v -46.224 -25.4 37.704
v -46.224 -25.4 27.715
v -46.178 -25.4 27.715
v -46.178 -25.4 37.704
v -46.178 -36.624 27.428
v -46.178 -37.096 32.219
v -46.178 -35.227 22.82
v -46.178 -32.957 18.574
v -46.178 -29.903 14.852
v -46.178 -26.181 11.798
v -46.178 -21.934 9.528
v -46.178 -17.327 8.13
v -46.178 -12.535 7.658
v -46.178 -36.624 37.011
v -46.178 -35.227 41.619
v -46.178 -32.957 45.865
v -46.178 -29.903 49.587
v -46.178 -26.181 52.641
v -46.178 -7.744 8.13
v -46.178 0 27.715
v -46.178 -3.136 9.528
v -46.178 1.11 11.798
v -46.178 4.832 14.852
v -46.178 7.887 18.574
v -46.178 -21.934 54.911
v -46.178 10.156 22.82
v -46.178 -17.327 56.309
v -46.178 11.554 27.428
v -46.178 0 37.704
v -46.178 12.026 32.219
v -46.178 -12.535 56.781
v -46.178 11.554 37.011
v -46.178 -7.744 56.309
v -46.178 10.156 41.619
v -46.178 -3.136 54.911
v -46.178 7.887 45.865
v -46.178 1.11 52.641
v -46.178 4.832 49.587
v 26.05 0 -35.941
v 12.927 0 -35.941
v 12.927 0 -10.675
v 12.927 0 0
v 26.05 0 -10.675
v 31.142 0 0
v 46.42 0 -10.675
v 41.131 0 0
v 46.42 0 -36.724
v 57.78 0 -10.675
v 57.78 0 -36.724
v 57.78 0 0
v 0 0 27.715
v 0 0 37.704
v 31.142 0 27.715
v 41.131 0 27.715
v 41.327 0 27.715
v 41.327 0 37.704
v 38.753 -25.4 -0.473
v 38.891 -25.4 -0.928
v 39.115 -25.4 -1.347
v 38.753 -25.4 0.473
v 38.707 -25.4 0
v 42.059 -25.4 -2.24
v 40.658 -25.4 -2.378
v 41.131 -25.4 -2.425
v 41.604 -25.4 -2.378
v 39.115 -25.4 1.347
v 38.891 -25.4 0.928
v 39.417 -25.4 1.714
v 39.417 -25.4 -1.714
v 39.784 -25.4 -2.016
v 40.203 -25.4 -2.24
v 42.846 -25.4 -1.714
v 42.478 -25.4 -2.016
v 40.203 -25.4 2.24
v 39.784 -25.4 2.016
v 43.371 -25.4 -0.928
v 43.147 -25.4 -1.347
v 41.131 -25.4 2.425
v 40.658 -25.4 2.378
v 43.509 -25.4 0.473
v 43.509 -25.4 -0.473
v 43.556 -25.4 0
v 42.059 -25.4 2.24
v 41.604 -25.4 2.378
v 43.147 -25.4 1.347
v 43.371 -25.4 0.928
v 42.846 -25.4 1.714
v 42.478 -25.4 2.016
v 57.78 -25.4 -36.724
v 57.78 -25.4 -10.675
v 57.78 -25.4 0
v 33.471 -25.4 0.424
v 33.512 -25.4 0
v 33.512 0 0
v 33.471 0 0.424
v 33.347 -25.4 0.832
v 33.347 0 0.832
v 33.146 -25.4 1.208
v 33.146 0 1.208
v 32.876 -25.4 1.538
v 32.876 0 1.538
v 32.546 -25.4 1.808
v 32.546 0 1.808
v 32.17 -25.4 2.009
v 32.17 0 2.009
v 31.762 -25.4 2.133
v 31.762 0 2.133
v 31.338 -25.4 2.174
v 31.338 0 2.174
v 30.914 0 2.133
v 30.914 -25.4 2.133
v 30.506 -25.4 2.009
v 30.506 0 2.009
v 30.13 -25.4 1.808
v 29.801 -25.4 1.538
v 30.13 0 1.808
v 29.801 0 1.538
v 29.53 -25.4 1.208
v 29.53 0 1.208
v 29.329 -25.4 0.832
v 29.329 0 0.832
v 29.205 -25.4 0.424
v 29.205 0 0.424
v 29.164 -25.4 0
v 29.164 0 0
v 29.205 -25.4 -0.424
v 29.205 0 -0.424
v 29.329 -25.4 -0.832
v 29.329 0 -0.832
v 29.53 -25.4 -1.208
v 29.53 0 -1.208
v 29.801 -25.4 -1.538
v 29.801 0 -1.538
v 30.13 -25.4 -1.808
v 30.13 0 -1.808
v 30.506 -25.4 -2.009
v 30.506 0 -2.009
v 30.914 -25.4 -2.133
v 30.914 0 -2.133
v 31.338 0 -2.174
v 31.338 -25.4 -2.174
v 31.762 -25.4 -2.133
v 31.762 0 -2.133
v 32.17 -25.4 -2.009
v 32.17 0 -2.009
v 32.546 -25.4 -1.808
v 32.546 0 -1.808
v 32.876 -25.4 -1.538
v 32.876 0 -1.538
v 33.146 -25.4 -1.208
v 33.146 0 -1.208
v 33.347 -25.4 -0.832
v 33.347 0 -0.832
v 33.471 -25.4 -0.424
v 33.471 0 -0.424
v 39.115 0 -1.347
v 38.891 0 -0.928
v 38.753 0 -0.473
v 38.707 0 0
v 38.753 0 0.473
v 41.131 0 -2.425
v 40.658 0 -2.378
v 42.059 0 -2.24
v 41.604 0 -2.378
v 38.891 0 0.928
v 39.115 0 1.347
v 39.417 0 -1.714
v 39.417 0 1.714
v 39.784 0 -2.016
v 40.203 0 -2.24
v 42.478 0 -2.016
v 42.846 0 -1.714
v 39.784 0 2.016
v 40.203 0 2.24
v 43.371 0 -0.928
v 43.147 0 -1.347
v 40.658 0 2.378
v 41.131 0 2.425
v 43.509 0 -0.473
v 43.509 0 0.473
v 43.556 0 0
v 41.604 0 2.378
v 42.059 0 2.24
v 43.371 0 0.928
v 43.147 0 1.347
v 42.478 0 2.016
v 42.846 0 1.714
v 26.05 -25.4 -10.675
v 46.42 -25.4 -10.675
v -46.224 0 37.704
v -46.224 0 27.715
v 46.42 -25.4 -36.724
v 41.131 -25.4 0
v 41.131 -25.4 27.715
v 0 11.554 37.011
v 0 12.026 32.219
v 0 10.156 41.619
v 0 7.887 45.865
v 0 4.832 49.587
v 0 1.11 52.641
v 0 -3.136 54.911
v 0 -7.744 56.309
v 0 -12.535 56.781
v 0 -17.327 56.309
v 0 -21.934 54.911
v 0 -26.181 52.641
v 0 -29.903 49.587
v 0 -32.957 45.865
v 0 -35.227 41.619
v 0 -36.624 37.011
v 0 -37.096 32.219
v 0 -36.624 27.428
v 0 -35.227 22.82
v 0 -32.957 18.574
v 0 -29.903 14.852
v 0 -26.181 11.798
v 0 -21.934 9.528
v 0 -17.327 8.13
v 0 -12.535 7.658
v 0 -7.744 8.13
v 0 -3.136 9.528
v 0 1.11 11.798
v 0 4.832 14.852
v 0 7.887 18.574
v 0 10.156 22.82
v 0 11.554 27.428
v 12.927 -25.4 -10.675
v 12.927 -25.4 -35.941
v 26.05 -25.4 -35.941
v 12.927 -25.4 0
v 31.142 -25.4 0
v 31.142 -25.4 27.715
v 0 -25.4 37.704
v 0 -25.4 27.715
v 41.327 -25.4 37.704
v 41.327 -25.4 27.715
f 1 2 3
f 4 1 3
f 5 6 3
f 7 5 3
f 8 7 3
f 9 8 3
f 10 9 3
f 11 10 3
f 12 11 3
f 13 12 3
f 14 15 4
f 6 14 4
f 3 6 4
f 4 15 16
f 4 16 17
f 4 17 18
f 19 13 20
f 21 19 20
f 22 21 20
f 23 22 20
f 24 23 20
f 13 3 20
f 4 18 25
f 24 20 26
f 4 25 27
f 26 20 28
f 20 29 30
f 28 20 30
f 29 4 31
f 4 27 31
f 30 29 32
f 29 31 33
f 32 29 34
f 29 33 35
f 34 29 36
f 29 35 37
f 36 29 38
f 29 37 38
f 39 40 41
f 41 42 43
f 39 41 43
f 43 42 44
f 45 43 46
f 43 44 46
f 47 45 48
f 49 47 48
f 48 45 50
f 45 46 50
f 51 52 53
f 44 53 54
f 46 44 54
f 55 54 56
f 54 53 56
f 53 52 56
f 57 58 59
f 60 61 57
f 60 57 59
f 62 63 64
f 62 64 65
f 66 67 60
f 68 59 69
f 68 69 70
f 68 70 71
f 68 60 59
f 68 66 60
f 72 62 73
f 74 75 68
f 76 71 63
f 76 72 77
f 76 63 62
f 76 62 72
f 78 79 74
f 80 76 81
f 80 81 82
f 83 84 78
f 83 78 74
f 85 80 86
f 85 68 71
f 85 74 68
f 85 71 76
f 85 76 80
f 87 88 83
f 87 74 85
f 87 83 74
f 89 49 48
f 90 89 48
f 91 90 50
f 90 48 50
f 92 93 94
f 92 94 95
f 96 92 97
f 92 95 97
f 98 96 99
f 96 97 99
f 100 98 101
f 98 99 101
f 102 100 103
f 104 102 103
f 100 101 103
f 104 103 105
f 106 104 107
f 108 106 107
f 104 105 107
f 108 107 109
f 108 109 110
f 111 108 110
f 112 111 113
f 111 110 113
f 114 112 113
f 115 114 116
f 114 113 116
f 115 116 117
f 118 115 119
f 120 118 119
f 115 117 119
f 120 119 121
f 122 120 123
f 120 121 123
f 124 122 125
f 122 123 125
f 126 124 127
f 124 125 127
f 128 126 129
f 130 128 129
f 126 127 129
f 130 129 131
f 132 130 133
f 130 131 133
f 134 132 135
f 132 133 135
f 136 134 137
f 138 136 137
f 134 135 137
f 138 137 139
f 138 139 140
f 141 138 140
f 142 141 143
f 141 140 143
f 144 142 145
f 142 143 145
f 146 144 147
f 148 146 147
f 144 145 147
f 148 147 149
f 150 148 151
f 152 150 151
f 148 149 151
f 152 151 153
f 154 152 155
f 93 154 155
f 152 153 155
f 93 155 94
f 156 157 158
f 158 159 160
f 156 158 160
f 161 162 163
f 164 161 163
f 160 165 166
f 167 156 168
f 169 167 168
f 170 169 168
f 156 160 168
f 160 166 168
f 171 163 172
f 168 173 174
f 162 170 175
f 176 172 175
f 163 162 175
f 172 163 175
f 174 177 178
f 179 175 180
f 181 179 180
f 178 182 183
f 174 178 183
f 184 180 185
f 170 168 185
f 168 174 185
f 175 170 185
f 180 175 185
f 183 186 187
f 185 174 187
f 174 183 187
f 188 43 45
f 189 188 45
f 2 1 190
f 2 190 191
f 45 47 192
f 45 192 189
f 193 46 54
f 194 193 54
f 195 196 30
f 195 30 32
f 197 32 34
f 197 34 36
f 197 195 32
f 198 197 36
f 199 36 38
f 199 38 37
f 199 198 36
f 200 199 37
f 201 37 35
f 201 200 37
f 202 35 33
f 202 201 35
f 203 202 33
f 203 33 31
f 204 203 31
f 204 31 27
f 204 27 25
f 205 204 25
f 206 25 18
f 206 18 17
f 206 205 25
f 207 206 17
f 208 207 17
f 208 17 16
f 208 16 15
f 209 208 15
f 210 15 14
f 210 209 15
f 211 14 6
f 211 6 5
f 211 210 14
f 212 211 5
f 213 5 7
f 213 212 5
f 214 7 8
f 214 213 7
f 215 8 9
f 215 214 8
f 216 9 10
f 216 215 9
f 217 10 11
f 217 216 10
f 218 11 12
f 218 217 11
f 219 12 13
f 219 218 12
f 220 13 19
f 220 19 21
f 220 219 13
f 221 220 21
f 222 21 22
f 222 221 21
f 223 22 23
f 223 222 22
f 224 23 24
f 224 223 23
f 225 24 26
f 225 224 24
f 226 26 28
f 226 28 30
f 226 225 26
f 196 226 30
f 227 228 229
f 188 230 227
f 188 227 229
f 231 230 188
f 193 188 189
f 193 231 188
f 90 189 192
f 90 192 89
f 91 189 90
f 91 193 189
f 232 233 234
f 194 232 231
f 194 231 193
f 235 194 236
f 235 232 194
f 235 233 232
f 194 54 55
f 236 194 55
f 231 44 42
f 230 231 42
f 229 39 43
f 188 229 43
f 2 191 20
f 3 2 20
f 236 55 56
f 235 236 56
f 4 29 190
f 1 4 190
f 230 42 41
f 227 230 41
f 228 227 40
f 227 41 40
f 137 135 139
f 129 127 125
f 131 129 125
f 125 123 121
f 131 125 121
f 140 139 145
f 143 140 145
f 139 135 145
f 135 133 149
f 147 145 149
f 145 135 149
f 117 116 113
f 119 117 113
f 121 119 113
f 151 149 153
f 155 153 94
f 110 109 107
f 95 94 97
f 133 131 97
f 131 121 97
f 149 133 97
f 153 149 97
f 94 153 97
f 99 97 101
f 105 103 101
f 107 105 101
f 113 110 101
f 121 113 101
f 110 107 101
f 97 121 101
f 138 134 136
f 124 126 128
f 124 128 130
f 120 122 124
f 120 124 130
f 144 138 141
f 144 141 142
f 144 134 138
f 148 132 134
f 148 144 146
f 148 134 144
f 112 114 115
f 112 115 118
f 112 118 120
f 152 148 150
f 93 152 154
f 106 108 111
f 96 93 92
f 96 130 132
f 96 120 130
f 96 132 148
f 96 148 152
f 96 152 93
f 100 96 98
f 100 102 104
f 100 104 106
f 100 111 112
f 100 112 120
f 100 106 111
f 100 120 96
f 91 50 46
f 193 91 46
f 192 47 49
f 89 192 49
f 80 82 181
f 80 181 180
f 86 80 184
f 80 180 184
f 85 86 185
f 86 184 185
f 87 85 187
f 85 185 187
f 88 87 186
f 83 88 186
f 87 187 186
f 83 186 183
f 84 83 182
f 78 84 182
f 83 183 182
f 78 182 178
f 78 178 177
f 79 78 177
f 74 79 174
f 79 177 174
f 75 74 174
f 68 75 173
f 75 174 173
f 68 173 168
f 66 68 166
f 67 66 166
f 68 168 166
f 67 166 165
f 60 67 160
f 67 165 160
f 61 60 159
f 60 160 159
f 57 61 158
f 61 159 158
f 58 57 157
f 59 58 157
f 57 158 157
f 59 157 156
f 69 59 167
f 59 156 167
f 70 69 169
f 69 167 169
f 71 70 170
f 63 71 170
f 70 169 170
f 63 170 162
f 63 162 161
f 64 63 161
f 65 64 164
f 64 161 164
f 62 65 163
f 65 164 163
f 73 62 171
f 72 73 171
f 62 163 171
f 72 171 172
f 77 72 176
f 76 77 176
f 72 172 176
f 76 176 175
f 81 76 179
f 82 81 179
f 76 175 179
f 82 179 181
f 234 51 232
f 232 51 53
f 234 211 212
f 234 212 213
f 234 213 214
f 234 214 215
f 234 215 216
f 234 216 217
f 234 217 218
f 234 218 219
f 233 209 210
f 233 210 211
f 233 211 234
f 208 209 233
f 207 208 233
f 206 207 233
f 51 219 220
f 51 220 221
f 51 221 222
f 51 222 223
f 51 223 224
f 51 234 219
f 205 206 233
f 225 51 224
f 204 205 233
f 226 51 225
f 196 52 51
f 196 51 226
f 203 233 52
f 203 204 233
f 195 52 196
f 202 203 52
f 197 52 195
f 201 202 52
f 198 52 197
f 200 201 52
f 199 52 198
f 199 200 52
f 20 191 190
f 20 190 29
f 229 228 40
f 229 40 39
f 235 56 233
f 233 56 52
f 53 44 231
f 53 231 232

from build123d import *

# Parameters (mm, degrees)
F0_W     = 9.9890101701
F0_H     = 27.7146026492
F0_W_2   = 13.1228137761
F0_H_2   = 25.2663148567
F0_W_3   = 11.3600492477
F0_H_3   = 26.0497657582
F2_DEPTH = 25.4
F1_R     = 2.4246663919
F1_R_2   = 2.1744313886
F4_R     = 24.5610859867
F5_DEPTH = 46.17845


# Not quite as in the source:
# - a feature of the source that left no trace in its solid (it failed there, or was rolled back) is left out


with BuildPart() as f2:
    # F0 (on Front) → F2 (new body)
    with BuildSketch(Plane.XZ):
        Polygon((41.3270741701, 37.7036109567), (-46.2236478925, 37.7036109567), (-46.2236478925, 27.7146026492), (31.1422031373, 27.7146026492), (41.1312133074, 27.7146026492), (41.3270741701, 27.7146026492), align=None)
        with Locations((36.1367082223, 13.8573013246)):
            Rectangle(F0_W, F0_H)
        Polygon((41.1312133074, 0), (31.1422031373, 0), (12.9269529134, 0), (12.9269529134, -10.6745297089), (26.0497666895, -10.6745297089), (46.4195124805, -10.6745297089), (57.7795617282, -10.6745297089), (57.7795617282, 0), align=None)
        with Locations((19.4883598015, -23.3076871373)):
            Rectangle(F0_W_2, F0_H_2)
        with Locations((52.0995371044, -23.699412588)):
            Rectangle(F0_W_3, F0_H_3)
    extrude(amount=F2_DEPTH)

    # F4 (on Right) → F5 (join)
    with BuildSketch(Plane.YZ):
        with Locations((-12.5352256, 32.2194471955)):
            Circle(F4_R)
    extrude(amount=-F5_DEPTH)


with BuildPart() as f2b:
    # F1 (on Front) → F2, piece 2 (new body)
    with BuildSketch(Plane.XZ):
        with Locations((41.1312133074, 0)):
            Circle(F1_R)
    extrude(amount=F2_DEPTH)


with BuildPart() as f2c:
    # F1 (on Front) → F2, piece 3 (new body)
    with BuildSketch(Plane.XZ):
        with Locations((31.3380658627, 0)):
            Circle(F1_R_2)
    extrude(amount=F2_DEPTH)


solid = Compound([f2.part, f2b.part, f2c.part])
